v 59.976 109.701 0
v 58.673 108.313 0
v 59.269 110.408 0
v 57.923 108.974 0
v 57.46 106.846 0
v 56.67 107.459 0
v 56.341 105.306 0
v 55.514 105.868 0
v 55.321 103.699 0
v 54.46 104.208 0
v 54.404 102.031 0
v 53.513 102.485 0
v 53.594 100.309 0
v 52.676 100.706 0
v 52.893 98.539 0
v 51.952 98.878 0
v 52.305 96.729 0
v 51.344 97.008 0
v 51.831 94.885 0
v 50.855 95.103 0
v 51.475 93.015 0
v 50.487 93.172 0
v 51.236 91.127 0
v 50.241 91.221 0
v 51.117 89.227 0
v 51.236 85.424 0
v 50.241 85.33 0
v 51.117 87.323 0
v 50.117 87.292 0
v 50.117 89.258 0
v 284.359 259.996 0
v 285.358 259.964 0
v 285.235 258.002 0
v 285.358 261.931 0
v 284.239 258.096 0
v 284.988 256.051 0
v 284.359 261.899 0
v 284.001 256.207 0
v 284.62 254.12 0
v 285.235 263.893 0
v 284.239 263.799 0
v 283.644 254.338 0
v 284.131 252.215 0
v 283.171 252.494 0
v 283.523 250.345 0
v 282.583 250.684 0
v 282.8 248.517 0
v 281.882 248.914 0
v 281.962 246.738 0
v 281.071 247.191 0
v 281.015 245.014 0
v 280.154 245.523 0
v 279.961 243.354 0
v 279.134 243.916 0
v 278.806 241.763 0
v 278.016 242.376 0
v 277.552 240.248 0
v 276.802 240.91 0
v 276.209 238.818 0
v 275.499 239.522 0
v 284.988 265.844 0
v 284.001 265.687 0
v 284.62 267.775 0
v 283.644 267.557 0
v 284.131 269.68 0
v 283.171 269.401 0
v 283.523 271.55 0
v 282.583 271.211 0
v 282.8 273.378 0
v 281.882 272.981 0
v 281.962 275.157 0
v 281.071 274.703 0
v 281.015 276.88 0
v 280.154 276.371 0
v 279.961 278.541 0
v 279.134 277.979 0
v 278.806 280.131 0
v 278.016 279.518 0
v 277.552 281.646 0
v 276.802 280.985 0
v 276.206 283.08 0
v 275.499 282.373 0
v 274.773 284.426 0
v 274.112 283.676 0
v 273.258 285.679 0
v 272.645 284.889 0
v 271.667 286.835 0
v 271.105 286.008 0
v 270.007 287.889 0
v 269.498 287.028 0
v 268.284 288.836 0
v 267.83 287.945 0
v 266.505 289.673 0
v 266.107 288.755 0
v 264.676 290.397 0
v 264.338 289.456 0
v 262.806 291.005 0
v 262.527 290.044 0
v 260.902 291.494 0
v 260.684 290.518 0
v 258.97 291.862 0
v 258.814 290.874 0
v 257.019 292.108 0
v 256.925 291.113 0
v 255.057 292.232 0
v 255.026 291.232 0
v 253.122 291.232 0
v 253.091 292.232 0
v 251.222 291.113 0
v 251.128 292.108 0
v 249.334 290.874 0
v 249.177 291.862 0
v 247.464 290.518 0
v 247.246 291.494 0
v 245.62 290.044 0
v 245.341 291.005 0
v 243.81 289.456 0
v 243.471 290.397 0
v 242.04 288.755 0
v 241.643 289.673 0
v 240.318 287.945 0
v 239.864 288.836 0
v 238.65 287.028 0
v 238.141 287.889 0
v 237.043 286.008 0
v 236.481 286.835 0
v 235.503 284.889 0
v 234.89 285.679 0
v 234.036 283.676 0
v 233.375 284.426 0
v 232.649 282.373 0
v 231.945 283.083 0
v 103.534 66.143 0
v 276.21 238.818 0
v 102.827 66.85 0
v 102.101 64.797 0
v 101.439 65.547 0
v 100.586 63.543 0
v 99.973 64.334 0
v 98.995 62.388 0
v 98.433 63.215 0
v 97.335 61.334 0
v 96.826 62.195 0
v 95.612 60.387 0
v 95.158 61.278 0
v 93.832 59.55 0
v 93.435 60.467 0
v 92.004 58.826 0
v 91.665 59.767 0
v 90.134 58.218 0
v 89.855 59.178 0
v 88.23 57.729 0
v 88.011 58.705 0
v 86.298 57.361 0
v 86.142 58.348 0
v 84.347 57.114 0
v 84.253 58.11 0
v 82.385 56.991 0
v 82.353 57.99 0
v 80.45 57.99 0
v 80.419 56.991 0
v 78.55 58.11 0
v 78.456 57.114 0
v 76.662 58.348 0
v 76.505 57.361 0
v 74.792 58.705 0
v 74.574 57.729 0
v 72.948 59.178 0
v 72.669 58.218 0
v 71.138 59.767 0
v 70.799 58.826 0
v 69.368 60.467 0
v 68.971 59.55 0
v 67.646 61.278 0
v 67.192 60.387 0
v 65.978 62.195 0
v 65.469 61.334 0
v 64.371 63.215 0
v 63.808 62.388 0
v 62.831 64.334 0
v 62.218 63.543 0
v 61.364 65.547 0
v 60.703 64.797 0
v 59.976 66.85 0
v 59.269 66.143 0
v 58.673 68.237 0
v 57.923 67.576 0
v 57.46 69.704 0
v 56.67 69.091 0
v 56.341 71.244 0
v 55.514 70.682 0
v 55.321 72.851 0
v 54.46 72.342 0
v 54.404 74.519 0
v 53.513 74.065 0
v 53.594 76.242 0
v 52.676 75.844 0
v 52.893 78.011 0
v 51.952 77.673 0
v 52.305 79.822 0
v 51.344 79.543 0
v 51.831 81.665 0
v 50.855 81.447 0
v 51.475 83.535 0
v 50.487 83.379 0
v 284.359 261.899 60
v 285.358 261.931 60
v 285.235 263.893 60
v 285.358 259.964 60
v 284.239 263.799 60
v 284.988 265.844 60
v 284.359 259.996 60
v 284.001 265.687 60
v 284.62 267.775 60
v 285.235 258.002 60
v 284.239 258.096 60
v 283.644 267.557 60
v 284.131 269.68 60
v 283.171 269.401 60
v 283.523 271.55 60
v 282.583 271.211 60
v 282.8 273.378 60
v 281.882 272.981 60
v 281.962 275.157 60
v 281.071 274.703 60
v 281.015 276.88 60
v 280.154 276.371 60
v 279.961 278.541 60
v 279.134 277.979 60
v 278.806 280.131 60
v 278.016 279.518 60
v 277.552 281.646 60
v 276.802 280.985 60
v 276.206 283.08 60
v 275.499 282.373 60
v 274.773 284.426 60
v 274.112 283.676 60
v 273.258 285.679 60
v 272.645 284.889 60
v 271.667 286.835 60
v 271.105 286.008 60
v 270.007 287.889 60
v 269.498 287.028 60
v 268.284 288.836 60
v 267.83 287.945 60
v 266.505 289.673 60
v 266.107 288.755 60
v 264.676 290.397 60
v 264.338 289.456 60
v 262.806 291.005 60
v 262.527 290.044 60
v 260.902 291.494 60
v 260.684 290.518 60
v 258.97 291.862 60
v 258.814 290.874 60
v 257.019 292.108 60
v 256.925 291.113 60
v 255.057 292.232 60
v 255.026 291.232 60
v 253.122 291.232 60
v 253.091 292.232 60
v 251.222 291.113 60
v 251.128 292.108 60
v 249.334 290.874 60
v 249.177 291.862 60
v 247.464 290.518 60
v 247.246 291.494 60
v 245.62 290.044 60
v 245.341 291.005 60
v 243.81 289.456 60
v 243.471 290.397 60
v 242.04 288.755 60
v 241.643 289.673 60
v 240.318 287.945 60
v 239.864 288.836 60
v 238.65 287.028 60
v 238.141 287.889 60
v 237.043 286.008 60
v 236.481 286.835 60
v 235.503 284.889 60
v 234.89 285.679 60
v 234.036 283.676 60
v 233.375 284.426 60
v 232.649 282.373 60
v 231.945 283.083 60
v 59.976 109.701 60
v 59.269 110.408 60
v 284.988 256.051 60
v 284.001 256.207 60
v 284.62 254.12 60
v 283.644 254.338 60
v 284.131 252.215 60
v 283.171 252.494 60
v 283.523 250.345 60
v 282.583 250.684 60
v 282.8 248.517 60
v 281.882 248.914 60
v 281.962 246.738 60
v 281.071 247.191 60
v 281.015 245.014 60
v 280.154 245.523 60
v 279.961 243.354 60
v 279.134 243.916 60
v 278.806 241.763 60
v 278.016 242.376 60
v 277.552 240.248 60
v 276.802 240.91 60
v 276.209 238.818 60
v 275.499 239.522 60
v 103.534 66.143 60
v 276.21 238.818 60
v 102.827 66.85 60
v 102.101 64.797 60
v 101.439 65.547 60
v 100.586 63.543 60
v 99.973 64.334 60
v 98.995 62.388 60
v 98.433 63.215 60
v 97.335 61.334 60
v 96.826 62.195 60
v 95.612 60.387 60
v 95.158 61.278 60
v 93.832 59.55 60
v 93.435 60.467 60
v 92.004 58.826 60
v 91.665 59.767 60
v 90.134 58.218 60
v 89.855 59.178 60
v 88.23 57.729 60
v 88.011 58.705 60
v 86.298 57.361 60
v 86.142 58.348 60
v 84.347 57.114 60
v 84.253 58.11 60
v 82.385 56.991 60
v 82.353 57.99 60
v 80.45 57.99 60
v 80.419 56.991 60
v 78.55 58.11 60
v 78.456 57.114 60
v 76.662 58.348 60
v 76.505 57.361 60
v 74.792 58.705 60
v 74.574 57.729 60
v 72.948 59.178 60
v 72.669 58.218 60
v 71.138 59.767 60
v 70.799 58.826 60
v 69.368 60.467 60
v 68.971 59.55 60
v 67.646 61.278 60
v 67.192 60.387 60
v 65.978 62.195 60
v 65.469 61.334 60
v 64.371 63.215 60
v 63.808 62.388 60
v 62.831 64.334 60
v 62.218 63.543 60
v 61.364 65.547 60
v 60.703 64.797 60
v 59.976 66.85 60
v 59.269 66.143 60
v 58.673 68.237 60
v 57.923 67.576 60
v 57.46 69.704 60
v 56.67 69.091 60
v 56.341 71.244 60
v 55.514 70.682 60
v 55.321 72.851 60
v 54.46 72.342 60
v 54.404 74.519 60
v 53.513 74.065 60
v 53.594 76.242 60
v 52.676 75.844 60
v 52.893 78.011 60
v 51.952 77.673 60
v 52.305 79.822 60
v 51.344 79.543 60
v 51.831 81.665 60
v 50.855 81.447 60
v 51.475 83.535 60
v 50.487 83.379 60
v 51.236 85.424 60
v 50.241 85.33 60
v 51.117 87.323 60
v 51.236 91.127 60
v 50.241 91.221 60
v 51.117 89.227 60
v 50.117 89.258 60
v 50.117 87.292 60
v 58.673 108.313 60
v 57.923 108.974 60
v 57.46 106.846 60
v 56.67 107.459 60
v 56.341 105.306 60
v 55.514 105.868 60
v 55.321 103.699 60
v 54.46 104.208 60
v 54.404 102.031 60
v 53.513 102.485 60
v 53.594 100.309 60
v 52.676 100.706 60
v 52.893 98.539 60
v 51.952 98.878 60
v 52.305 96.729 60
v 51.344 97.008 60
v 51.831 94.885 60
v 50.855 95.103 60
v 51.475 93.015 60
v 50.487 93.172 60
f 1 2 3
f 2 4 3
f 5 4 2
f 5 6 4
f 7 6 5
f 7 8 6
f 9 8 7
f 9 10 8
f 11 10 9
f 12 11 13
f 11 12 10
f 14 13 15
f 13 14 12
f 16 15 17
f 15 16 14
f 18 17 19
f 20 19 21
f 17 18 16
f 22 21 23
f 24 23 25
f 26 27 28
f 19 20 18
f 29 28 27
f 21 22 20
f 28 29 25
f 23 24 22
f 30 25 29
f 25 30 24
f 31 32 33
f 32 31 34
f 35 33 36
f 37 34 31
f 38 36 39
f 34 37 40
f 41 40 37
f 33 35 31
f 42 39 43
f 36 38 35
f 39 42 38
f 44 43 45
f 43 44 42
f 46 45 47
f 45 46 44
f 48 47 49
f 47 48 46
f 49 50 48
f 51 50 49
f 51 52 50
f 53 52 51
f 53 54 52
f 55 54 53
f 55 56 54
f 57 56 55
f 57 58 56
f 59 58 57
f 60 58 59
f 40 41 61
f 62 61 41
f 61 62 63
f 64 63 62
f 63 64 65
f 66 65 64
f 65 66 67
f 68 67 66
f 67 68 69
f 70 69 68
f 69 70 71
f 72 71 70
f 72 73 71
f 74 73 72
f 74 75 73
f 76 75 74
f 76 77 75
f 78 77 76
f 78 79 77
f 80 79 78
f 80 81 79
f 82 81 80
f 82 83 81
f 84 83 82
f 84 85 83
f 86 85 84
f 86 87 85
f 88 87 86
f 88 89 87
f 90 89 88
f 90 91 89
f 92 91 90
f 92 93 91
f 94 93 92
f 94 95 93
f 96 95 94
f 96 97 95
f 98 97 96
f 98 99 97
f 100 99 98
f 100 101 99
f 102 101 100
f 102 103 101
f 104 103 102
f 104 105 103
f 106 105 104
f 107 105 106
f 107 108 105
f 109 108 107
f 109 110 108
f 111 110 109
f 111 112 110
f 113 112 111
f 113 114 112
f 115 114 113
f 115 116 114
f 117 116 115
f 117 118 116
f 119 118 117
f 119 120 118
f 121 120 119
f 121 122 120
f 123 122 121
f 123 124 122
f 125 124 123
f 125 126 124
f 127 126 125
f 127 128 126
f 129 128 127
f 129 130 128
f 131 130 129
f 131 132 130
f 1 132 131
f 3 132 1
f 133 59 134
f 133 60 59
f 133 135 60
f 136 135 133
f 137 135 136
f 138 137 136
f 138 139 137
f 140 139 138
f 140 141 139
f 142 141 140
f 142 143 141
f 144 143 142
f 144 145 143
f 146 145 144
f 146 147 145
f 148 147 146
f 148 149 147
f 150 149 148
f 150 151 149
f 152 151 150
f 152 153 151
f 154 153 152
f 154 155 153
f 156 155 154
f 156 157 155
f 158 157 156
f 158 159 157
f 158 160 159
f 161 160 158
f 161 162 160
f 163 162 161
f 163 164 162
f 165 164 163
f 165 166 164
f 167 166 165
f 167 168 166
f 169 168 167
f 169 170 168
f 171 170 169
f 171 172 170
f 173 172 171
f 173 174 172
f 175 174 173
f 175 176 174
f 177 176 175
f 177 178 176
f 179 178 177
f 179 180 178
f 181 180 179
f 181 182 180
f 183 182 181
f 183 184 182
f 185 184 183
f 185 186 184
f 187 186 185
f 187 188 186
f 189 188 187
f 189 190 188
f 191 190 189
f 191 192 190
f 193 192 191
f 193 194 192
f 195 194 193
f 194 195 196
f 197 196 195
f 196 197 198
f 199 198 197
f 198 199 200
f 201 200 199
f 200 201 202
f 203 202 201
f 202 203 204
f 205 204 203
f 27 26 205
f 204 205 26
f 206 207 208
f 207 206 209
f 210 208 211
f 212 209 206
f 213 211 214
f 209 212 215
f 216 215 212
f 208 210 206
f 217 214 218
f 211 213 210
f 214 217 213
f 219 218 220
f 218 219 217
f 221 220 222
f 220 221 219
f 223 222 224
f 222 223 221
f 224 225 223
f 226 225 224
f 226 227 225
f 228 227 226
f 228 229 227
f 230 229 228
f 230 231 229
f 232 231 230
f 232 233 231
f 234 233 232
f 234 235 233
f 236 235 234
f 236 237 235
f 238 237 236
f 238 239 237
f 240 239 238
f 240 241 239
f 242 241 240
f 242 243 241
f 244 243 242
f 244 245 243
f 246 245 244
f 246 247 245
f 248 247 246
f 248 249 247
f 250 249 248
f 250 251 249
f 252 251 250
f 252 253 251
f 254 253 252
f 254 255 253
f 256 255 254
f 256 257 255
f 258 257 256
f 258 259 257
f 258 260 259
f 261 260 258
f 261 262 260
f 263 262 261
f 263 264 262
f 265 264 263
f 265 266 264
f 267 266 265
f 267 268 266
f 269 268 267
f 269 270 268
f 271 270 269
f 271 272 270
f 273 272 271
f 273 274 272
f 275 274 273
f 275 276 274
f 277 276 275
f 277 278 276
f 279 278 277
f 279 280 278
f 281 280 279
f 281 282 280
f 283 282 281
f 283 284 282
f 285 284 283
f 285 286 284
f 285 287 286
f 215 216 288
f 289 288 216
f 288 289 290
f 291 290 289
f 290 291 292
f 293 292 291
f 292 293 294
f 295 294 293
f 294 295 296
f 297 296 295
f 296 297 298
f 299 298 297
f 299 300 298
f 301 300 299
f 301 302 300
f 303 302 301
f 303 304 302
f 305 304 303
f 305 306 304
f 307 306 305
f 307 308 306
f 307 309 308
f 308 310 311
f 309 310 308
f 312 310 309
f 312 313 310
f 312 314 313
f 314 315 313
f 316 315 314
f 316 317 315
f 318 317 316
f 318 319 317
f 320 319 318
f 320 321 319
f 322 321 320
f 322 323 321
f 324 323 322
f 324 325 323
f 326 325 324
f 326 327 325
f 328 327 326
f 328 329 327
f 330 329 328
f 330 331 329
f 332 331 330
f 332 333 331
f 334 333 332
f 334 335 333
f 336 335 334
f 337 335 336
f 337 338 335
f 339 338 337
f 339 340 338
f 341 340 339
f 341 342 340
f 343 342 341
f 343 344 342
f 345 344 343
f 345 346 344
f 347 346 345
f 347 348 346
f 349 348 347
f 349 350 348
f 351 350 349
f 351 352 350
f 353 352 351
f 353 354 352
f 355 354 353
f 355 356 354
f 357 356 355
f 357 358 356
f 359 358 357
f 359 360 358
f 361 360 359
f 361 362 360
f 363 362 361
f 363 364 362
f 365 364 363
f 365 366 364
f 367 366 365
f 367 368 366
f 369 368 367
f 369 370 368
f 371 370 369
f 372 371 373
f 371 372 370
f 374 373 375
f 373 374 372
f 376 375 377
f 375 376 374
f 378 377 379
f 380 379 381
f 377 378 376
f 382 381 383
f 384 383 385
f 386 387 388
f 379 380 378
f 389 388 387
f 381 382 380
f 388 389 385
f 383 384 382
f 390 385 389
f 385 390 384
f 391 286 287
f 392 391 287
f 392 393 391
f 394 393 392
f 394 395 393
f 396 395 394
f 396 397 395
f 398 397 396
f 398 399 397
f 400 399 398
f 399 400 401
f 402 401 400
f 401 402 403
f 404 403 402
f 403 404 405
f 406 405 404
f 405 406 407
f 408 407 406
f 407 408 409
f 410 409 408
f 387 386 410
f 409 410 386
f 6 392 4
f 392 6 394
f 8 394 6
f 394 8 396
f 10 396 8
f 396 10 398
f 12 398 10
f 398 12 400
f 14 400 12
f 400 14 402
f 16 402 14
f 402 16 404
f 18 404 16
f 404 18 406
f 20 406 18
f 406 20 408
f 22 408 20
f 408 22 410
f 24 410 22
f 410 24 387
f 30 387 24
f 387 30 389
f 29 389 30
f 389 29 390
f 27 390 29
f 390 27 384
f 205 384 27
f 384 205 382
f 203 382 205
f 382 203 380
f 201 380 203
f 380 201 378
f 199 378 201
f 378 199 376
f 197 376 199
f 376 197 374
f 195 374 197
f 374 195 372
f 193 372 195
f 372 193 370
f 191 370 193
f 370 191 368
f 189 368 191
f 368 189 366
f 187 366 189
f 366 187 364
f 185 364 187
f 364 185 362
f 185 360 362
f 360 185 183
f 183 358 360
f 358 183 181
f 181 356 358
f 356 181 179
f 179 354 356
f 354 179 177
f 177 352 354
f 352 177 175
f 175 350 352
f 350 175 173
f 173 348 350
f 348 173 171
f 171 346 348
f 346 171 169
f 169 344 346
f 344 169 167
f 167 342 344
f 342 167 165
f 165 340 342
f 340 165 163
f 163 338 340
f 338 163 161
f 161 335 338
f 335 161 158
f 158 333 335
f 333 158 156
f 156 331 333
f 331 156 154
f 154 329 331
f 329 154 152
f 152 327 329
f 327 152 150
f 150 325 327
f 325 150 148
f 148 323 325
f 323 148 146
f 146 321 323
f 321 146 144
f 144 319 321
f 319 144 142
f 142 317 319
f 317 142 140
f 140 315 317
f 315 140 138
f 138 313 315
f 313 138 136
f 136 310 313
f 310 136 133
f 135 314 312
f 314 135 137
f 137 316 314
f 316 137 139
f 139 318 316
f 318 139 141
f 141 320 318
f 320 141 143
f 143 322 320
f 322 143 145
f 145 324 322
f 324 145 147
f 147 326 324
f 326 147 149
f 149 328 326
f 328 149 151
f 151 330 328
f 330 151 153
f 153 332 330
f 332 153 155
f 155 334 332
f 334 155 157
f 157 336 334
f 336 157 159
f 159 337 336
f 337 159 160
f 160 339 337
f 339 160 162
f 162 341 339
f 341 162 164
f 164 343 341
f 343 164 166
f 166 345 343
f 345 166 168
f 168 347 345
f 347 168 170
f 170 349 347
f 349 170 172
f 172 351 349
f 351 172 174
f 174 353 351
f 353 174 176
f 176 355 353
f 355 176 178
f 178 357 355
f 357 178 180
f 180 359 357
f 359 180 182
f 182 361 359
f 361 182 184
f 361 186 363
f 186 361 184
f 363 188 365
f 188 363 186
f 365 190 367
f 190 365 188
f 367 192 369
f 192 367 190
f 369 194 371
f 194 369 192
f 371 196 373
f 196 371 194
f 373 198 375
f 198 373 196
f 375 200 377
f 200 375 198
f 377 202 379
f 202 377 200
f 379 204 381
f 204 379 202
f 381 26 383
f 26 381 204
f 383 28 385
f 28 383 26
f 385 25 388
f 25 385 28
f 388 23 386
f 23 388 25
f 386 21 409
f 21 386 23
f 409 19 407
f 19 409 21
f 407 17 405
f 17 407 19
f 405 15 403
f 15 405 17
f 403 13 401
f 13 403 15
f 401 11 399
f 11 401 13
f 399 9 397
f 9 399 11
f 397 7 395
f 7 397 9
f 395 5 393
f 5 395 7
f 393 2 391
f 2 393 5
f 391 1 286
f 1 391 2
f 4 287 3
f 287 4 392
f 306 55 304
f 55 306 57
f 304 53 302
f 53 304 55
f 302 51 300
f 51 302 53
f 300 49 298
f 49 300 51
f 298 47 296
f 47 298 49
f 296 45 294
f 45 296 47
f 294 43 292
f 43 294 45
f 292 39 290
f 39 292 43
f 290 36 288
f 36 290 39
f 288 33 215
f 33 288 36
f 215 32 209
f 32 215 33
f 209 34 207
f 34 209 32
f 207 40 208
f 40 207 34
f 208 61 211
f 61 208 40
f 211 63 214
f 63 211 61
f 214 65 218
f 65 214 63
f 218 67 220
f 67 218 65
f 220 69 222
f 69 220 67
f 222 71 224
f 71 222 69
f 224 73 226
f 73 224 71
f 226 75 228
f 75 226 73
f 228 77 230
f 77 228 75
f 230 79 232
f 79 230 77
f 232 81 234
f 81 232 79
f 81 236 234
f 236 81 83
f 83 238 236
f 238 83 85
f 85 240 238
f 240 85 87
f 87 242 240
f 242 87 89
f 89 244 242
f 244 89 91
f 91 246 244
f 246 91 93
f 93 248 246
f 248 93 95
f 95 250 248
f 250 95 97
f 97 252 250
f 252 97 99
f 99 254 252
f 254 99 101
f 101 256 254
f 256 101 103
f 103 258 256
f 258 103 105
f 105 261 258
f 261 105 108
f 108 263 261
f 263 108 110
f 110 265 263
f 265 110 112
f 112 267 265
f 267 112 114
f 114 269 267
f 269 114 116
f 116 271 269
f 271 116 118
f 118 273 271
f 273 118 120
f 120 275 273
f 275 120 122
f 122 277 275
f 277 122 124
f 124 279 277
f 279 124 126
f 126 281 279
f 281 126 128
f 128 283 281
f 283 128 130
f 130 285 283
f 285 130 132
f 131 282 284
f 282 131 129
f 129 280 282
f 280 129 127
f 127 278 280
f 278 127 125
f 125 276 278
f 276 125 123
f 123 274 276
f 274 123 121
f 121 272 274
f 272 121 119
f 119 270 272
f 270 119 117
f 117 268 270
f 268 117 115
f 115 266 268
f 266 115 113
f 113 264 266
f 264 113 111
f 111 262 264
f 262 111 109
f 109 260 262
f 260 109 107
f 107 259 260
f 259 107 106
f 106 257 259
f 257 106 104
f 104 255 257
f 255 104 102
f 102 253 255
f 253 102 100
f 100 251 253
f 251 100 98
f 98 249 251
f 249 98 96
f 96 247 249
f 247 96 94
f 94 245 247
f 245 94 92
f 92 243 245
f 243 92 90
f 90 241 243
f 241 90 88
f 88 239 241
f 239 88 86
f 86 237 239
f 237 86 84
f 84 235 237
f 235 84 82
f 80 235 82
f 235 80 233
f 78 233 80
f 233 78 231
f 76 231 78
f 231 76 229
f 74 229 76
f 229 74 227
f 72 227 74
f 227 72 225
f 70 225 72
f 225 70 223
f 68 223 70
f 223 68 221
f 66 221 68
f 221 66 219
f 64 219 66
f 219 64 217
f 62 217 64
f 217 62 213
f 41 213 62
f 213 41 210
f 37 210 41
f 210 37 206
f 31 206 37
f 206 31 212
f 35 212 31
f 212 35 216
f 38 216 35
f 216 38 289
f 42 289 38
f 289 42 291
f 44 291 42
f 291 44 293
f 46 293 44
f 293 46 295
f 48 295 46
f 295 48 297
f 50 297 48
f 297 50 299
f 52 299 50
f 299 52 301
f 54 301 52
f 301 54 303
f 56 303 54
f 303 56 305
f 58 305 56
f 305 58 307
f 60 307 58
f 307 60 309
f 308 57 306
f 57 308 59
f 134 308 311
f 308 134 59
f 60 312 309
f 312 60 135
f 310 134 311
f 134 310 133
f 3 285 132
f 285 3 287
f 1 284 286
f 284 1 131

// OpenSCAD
// file: arcBuilder.scad
fn = 24;

module sector(radius=10, anglesSector=[0, 180], fn = 100) {
    r = radius / cos(180 / fn);
    step = -360 / fn;

    points = concat([[0, 0]],
        [for(a = [anglesSector[0] : step : anglesSector[1] - 360]) 
            [r * cos(a), r * sin(a)]
        ],
        [[r * cos(anglesSector[1]), r * sin(anglesSector[1])]]
    );

    difference() {
        circle(radius, $fn = fn);
        polygon(points);
    }
}

module arc(radius, anglesArc=[0,45], width = 1, fn = 100) {
    difference() {
        sector(radius + width, anglesArc, fn);
        sector(radius, anglesArc, fn);
    }
} 

//linear_extrude(1) arc(radius, angles, width);
// file: 3dPrintBed.scad
footToMillimeters=304.8;

module hotPlate(length=1, width=1, height=10) {
    color("grey",1.0) {
        translate([0,0,-height]) {
            cube([length*footToMillimeters, width*footToMillimeters, height]);
        }
    }
}
module gridPlate(length=1, width=1, height = 9) {
    // For grid X 
    for(i = [0 : 2]) {
        translateX = i*(304.8/4);
        translate([0,footToMillimeters/4 + translateX, -height]) {
            gridX();
        }
    }
    
    // For grid Y
    for(i = [0 : 2]) {
        translateY = i*(304.8/4);
        translate([footToMillimeters/4 + translateY, 0, -height]) {
            gridY();
        }
    }
}

module gridY(length=1, width=1, height=10) {
    color("LimeGreen", 1.0) {
        cube([1, width*footToMillimeters, height]);
    }
}
module gridX(length=1, width=1, height=10) {
    color("Crimson", 1.0) {
        cube([length*footToMillimeters, 1, height]);
    }
}
// main file
// Jim Samson
// Second version of the belt

include <3dPrintBed.scad>
include <arcBuilder.scad>

$fs=0.01;
footToMillimeters=304.8;

// For line Length
lineLength=footToMillimeters/3.357;
linePlacement = footToMillimeters/8;

// For Circles
radius = 30.3;
angles = [-90, 90];
offsetOfHalfCircles=radius*2;

beltHeight=60; // millimeters
beltWidth=1;
beltLength=1*footToMillimeters-offsetOfHalfCircles;

// For Circles
width = beltWidth;

// For total length of belt
offsetTotalLength = 0.6;

belt(); // Just like a main function

module belt() {
    //hotPlate(); // From 3dPrintBed hotPlate module
    //gridPlate(); // From 3dPrintBed gridPlate module
    
    translate([lineLength+50,-25,0]) {
        rotate([0,0,45]) {
            union() {
                beltCircleA();
                beltCircleB();
                lineA();
                lineB();
            }
        }
    }  
}

module beltCircleA() {
    translate([linePlacement, lineLength+radius+beltWidth, 0]) {
        rotate([0,0,180]) {
            HalfCircle();
        }
    }
}

module beltCircleB() {
    translate([lineLength+linePlacement*4+linePlacement+1, lineLength+radius+beltWidth, 0]) {
            HalfCircle();
    }
}

module HalfCircle() {
    linear_extrude(beltHeight) arc(radius, angles, width);
}

module lineA() {
    translate([linePlacement, lineLength, 0]) {
        lineX();
    }
}

module lineB() {
    translate([linePlacement, lineLength*2-29.1953599, 0]) {
        lineX();
    }
}

module lineX() {
    #cube([beltLength, beltWidth, beltHeight]);
}
